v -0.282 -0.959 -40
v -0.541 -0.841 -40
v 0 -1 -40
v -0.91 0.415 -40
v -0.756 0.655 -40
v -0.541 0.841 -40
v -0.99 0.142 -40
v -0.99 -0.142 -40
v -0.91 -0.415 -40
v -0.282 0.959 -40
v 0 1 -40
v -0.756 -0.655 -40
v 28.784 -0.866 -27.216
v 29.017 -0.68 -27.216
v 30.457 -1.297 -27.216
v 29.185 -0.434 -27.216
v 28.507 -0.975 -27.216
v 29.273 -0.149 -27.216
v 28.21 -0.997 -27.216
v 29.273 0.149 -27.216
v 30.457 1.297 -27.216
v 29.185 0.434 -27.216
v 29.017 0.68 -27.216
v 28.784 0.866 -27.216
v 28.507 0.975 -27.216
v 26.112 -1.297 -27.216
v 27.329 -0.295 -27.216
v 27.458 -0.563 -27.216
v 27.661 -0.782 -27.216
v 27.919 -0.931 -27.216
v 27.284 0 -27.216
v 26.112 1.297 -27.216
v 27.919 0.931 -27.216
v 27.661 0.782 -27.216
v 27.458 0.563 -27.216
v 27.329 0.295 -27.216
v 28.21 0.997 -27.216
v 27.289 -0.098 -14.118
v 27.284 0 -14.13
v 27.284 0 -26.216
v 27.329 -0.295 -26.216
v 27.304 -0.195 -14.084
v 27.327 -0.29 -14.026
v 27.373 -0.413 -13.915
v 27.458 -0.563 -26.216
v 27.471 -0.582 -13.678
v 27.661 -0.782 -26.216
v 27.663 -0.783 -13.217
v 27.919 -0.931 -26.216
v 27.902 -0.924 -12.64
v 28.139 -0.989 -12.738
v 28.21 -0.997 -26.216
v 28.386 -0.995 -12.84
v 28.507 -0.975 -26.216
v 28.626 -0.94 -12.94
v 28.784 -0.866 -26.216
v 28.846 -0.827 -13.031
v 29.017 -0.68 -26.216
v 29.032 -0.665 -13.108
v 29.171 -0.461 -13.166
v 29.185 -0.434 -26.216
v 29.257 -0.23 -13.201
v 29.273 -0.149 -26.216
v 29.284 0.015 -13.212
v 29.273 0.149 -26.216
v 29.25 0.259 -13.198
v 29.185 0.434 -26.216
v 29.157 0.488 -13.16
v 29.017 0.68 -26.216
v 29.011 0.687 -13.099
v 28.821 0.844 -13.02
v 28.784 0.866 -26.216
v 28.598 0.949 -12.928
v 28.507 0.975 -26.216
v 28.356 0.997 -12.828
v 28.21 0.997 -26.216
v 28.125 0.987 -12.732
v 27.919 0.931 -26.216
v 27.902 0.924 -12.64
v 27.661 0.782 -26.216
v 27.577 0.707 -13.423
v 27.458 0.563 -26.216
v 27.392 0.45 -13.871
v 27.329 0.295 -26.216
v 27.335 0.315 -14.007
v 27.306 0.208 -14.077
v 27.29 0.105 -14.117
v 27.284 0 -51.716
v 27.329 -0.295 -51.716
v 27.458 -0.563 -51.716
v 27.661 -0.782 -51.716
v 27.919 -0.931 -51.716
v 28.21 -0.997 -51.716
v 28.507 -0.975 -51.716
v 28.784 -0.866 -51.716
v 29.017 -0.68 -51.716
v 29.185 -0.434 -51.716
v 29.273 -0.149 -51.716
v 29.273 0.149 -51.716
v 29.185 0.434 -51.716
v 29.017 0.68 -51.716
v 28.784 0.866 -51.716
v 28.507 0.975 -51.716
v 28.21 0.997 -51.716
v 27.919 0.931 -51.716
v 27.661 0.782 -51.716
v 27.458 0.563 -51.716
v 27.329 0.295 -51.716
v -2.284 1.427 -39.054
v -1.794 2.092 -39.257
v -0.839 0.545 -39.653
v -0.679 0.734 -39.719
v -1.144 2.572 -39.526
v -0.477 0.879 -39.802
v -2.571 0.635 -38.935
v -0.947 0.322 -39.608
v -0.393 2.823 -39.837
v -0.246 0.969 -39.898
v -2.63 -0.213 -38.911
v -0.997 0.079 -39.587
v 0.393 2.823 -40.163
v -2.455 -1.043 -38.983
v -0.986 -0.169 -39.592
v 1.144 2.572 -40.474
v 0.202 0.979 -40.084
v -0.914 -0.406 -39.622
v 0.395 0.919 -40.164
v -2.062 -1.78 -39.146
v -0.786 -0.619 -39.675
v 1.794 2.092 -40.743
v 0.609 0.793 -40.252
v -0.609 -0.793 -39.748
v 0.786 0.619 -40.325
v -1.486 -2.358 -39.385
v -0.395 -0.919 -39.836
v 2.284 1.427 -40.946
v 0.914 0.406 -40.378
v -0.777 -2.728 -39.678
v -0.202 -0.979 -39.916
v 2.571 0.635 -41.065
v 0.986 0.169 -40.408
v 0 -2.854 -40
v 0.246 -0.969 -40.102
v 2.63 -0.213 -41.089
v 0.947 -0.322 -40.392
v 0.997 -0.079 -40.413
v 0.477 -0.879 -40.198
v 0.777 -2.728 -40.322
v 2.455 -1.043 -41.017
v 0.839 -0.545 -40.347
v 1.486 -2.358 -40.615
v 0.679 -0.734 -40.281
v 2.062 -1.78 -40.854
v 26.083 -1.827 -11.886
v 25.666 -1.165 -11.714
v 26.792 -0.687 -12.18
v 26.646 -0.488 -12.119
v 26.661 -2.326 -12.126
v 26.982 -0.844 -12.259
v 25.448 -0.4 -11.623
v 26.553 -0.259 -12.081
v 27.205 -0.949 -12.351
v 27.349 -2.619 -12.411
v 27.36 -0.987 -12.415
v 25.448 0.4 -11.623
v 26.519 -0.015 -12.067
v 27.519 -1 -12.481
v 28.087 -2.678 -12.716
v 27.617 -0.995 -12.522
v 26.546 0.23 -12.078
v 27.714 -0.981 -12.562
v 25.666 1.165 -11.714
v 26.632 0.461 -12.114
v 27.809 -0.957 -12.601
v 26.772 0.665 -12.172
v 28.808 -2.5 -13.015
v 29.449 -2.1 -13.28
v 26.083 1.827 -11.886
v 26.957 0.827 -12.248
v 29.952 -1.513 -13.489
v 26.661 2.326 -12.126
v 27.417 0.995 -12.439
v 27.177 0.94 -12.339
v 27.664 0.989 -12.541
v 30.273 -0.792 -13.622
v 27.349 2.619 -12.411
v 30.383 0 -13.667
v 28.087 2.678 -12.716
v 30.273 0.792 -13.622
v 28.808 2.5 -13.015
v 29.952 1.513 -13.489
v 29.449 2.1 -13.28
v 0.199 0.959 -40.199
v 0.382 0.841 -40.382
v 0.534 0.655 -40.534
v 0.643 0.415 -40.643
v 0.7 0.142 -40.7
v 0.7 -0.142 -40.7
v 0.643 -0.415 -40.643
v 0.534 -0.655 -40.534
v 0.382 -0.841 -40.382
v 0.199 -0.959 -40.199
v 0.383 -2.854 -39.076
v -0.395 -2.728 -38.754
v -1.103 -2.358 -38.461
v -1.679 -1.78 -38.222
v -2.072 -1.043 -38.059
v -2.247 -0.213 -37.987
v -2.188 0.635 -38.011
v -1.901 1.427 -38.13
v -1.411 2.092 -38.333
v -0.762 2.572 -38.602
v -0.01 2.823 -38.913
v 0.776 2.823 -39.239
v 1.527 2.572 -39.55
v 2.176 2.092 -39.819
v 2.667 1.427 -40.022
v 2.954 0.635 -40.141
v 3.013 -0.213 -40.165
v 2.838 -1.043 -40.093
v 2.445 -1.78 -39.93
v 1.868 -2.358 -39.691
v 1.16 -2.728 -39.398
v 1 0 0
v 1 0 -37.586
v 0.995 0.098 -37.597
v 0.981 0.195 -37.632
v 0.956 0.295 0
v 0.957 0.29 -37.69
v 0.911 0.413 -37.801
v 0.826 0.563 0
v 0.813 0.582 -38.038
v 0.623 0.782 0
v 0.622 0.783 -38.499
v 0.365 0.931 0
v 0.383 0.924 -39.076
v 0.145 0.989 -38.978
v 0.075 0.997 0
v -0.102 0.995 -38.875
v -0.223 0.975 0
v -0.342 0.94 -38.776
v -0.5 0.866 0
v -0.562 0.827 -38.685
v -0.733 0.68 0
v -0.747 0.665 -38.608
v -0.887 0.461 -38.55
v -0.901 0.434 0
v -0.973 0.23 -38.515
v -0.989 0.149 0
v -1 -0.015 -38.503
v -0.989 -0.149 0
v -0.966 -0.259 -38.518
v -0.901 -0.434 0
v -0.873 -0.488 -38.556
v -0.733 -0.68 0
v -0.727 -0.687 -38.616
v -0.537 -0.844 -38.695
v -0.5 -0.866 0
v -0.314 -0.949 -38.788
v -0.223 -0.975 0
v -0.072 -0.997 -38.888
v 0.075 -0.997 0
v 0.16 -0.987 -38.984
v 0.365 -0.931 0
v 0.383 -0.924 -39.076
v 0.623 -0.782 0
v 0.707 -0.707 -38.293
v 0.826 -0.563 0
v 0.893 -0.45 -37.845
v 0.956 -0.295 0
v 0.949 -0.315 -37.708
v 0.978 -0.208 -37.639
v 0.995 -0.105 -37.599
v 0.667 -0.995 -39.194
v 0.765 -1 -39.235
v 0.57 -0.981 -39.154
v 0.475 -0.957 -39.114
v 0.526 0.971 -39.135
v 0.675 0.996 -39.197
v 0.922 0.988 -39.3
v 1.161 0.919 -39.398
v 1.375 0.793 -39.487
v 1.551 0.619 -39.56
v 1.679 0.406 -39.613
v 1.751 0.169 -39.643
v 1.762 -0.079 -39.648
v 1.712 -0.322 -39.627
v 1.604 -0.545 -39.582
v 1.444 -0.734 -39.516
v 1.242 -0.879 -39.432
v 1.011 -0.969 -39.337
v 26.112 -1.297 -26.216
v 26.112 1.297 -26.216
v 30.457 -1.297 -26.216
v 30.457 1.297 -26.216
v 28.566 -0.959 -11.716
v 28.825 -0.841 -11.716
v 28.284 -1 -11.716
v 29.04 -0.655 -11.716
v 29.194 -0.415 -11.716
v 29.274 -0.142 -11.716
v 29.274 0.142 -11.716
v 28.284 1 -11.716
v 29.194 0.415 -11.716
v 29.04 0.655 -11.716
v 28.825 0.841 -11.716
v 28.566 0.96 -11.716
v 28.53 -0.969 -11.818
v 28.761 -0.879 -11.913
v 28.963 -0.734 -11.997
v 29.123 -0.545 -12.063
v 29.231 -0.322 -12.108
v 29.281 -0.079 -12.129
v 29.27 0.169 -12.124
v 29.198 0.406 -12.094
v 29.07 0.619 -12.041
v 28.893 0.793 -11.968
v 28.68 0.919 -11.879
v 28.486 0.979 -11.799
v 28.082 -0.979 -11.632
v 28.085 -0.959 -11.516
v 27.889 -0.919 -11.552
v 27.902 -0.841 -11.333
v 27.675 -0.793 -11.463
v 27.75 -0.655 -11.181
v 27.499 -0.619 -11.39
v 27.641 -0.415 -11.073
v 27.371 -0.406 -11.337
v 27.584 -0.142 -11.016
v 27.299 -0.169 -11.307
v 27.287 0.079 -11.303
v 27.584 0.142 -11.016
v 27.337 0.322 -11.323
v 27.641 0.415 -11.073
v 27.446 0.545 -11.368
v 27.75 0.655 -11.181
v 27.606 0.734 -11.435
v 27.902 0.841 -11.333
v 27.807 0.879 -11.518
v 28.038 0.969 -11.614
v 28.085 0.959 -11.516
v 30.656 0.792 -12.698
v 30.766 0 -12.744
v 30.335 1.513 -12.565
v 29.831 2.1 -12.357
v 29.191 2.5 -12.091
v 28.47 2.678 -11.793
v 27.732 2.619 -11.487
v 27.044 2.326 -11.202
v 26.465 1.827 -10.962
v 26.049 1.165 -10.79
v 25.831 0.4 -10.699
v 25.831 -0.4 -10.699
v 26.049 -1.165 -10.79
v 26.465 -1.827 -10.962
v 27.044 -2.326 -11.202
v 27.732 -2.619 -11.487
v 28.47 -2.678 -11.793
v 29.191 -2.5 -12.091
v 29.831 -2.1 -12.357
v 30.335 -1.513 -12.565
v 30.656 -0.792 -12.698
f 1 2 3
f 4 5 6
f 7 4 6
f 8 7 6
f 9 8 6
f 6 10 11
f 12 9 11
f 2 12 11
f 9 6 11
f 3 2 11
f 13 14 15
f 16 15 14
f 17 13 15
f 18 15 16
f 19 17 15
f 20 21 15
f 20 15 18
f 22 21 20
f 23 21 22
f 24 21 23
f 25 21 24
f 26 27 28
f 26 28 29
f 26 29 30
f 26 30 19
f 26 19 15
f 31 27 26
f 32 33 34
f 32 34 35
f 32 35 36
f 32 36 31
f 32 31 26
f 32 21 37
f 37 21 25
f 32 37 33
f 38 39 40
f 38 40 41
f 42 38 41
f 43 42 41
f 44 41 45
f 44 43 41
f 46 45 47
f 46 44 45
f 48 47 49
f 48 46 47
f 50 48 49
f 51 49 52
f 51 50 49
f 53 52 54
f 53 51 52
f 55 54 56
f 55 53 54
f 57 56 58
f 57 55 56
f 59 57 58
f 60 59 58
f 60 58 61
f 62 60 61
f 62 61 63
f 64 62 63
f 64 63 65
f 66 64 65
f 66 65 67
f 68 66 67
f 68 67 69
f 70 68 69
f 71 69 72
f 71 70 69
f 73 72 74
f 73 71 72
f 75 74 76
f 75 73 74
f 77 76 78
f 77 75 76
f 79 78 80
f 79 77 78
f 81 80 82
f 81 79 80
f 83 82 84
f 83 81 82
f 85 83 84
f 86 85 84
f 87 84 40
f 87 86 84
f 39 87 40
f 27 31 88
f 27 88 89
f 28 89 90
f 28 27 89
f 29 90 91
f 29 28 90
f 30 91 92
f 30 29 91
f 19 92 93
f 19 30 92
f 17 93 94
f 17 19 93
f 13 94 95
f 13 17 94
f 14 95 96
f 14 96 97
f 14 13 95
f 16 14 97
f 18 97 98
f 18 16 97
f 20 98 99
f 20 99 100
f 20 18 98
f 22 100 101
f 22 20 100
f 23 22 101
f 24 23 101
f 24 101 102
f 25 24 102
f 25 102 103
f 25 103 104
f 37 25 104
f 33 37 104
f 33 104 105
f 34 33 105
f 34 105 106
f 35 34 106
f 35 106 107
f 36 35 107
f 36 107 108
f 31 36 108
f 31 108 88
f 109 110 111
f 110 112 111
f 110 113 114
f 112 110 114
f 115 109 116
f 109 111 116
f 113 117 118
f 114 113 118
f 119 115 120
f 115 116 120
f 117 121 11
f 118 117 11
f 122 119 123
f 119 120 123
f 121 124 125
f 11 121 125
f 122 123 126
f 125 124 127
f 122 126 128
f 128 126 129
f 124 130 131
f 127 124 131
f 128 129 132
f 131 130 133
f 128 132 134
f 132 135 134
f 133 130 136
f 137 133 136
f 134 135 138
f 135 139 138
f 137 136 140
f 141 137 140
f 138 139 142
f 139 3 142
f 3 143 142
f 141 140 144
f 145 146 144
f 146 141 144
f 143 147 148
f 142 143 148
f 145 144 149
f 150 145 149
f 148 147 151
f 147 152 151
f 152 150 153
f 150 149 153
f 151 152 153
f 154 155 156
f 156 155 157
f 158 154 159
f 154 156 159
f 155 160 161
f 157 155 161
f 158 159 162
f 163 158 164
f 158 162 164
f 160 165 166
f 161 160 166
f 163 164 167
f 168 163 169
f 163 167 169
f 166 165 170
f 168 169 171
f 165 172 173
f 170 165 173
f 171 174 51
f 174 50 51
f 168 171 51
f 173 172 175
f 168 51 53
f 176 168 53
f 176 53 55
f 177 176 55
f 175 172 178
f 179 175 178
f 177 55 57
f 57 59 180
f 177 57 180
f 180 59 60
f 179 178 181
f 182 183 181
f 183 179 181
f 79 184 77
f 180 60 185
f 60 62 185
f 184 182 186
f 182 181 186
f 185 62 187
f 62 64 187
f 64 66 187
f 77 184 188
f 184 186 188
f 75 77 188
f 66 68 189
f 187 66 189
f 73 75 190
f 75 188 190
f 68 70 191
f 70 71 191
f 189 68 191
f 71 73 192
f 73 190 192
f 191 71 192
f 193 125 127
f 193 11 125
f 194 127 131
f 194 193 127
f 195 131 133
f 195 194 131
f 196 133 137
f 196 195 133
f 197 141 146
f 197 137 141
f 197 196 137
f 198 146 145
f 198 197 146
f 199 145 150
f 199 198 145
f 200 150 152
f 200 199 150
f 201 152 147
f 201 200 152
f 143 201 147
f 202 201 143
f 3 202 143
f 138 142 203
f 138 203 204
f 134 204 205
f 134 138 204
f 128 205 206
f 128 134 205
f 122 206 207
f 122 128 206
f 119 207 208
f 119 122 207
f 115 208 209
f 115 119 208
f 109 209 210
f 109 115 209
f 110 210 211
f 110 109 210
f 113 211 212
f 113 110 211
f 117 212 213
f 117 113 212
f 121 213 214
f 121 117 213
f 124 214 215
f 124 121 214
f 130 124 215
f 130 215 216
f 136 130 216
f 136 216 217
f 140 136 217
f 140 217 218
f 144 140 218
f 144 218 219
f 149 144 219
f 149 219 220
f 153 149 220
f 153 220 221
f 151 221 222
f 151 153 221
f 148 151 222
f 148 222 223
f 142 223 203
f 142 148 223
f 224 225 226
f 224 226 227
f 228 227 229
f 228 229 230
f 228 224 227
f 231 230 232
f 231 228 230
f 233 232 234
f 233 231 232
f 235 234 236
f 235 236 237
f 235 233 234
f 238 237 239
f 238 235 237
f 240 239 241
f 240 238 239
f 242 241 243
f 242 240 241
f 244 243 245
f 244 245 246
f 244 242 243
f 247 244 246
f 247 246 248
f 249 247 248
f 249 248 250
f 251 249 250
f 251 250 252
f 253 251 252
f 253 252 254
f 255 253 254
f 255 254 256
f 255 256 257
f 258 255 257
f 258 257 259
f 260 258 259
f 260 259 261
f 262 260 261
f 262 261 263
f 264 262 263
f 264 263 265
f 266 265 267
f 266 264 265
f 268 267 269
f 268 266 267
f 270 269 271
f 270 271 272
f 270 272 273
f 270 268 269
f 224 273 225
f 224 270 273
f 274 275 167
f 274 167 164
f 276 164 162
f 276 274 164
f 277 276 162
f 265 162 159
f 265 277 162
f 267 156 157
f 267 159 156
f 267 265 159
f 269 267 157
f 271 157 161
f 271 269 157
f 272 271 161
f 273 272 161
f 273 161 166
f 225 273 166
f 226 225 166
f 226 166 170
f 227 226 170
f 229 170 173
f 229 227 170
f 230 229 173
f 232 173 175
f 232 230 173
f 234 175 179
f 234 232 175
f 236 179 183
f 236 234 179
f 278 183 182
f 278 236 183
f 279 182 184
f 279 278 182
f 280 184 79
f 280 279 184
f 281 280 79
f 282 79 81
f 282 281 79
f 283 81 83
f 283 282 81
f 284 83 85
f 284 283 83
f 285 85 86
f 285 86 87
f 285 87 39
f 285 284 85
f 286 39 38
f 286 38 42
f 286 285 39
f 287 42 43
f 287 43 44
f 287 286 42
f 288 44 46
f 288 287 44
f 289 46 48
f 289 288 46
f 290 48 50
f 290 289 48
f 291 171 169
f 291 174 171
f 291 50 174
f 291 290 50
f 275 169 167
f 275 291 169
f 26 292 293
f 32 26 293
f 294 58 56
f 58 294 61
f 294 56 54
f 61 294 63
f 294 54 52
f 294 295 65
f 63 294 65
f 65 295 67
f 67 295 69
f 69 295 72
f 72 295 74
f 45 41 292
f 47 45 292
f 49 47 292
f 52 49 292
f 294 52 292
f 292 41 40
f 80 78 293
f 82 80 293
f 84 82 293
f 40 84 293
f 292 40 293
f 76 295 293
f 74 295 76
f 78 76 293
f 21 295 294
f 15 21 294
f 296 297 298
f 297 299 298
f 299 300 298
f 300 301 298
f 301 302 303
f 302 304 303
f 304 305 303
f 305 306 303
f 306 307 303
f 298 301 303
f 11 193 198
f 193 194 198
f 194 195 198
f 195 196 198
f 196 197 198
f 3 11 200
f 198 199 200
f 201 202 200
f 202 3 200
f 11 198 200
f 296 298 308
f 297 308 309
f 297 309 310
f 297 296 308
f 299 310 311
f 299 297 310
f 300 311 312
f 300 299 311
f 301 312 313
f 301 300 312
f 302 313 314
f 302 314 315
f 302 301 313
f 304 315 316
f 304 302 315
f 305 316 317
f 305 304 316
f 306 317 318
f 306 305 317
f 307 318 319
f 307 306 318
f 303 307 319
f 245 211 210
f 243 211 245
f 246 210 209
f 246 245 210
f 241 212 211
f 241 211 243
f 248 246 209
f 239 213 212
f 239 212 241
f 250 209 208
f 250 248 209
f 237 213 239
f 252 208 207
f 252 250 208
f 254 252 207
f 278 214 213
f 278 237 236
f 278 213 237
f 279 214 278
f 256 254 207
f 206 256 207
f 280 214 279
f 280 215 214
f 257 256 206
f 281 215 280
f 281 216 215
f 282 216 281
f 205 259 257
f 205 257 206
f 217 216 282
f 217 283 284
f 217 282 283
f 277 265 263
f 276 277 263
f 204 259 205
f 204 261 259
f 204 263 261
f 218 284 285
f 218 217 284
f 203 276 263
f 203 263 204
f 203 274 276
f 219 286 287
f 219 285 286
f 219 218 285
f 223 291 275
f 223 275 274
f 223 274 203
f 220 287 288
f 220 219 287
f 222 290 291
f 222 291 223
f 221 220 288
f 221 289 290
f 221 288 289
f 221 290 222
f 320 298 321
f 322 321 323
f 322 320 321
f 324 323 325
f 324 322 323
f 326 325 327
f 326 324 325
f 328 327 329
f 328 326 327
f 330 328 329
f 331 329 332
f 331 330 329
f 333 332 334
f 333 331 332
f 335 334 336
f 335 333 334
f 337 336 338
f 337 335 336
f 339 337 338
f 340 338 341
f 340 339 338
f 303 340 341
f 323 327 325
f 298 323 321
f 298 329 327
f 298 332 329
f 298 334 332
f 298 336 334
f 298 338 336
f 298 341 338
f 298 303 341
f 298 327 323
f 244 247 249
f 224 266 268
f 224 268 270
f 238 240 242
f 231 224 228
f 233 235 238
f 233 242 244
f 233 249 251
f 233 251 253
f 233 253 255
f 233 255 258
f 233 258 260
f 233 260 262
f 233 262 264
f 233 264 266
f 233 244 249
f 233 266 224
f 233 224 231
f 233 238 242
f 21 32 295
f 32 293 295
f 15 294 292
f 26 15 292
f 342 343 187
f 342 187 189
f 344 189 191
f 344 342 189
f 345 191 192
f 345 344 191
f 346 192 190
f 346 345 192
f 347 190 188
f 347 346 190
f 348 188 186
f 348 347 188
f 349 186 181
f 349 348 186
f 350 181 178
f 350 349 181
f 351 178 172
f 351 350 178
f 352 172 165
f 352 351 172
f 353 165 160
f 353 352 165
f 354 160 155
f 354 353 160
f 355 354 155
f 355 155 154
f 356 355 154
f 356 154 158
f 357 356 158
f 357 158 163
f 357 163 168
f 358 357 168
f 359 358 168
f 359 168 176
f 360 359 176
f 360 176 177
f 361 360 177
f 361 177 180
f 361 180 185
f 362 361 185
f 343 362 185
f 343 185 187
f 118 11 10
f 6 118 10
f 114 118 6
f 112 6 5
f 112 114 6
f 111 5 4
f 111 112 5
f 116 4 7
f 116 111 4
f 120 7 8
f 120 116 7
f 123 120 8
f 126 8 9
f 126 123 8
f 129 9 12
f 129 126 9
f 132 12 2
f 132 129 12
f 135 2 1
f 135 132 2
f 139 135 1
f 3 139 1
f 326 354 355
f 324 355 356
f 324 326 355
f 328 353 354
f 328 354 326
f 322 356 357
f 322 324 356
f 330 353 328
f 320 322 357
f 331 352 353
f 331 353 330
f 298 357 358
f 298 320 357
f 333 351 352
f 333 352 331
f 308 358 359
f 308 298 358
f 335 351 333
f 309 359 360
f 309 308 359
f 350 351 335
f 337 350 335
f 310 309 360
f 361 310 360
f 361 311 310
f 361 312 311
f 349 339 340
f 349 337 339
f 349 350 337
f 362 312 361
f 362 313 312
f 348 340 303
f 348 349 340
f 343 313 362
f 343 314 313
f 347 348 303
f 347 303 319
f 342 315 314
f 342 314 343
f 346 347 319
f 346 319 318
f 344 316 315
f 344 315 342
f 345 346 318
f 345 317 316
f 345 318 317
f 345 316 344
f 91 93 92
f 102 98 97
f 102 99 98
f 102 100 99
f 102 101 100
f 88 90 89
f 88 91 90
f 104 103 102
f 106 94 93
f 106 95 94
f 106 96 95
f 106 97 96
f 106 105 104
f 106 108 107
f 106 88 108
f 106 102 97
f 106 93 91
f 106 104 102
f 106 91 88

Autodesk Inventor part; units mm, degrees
ref_plane "XZ Plane" through (0, 0, 0) normal (0, 1, 0) x (-1, 0, 0)
ref_plane "XY Plane" through (0, 0, 0) normal (0, 0, 1) x (1, 0, 0)
sketch "Sketch1" plane through (0, 0, 0) normal (0, 0, 1) x (1, 0, 0)
  circle A0 centre (0, 0) radius 1
  dimension "d0" = 2
extrude "Extrusion1" add sketch "Sketch1" against normal blind 40
ref_plane "Work Plane1" through (0, 0, -40) normal (0, 0, -1) x (-1, 0, 0)
ref_plane "Work Plane3" through (0, 0, -40) normal (0.7071, 0, 0.7071) x (0, -1, 0)
ref_plane "Work Plane2" through (0, 0, -40) normal (1, 0, 0) x (0, 1, 0)
sketch "Sketch2" plane through (0, 0, -40) normal (0.7071, 0, 0.7071) x (0, -1, 0)
  ellipse E0 centre (0, 0) end of major axis (-1, 0) minor radius 0.7071 projected
  circle A0 centre (0, 0) radius 1
  point P0 (0, -28.2843)
extrude "Extrusion2" add sketch "Sketch2" along normal blind 40
ref_plane "Work Plane4" through (28.2843, 0, -11.7157) normal (0, 0, -1) x (-1, 0, 0)
sketch "Sketch3" plane through (28.2843, 0, -11.7157) normal (0, 0, -1) x (-1, 0, 0)
  ellipse E0 centre (0, 0) end of major axis (0, 1) minor radius 0.7071 projected
  circle A0 centre (0, 0) radius 1
  point P0 (28.2843, 0)
extrude "Extrusion3" add sketch "Sketch3" along normal blind 40
ref_plane "Work Plane5" through (0, 0, -40) normal (0.3827, 0, 0.9239) x (0, -1, 0)
sketch "Sketch4" plane through (0, 0, -40) normal (0.3827, 0, 0.9239) x (0, -1, 0)
  circle A0 centre (0, 0) radius 2.8545
  point P0 (0, -15.3073)
extrude "Extrusion4" add sketch "Sketch4" along normal blind 1
ref_plane "Work Plane6" through (28.2843, 0, -11.7157) normal (0.3827, 0, 0.9239) x (0.9239, 0, -0.3827)
sketch "Sketch5" plane through (28.2843, 0, -11.7157) normal (0.3827, 0, 0.9239) x (0.9239, 0, -0.3827)
  circle A0 centre (0, 0) radius 2.6859
  point P0 (-30.6147, 0)
extrude "Extrusion5" add sketch "Sketch5" against normal blind 1
ref_plane "Work Plane7" through (28.2843, 0, -26.2157) normal (0, 0, -1) x (-1, 0, 0)
sketch "Sketch6" plane through (28.2843, 0, -26.2157) normal (0, 0, -1) x (-1, 0, 0)
  ellipse E0 centre (0, 0) end of major axis (0, 2.6859) minor radius 2.4814 projected
  line L0 (-2.1727, -1.2973) -> (2.1727, -1.2973)
  line L1 (2.1727, -1.2973) -> (2.1727, 1.2973)
  line L2 (2.1727, 1.2973) -> (-2.1727, 1.2973)
  line L3 (-2.1727, 1.2973) -> (-2.1727, -1.2973)
  line L4 (0, -1) -> (0, 1) projected
  line L5 (-2.1727, -1.2973) -> (2.1727, 1.2973) construction
  line L6 (2.1727, -1.2973) -> (-2.1727, 1.2973) construction
  point P0 (28.2843, 0)
  point P1 (0, 0)
extrude "Extrusion6" add sketch "Sketch6" along normal blind 1 contours L2 L1 L0 L3
properties part number "00_Beam_Ocular_Detectoin"
